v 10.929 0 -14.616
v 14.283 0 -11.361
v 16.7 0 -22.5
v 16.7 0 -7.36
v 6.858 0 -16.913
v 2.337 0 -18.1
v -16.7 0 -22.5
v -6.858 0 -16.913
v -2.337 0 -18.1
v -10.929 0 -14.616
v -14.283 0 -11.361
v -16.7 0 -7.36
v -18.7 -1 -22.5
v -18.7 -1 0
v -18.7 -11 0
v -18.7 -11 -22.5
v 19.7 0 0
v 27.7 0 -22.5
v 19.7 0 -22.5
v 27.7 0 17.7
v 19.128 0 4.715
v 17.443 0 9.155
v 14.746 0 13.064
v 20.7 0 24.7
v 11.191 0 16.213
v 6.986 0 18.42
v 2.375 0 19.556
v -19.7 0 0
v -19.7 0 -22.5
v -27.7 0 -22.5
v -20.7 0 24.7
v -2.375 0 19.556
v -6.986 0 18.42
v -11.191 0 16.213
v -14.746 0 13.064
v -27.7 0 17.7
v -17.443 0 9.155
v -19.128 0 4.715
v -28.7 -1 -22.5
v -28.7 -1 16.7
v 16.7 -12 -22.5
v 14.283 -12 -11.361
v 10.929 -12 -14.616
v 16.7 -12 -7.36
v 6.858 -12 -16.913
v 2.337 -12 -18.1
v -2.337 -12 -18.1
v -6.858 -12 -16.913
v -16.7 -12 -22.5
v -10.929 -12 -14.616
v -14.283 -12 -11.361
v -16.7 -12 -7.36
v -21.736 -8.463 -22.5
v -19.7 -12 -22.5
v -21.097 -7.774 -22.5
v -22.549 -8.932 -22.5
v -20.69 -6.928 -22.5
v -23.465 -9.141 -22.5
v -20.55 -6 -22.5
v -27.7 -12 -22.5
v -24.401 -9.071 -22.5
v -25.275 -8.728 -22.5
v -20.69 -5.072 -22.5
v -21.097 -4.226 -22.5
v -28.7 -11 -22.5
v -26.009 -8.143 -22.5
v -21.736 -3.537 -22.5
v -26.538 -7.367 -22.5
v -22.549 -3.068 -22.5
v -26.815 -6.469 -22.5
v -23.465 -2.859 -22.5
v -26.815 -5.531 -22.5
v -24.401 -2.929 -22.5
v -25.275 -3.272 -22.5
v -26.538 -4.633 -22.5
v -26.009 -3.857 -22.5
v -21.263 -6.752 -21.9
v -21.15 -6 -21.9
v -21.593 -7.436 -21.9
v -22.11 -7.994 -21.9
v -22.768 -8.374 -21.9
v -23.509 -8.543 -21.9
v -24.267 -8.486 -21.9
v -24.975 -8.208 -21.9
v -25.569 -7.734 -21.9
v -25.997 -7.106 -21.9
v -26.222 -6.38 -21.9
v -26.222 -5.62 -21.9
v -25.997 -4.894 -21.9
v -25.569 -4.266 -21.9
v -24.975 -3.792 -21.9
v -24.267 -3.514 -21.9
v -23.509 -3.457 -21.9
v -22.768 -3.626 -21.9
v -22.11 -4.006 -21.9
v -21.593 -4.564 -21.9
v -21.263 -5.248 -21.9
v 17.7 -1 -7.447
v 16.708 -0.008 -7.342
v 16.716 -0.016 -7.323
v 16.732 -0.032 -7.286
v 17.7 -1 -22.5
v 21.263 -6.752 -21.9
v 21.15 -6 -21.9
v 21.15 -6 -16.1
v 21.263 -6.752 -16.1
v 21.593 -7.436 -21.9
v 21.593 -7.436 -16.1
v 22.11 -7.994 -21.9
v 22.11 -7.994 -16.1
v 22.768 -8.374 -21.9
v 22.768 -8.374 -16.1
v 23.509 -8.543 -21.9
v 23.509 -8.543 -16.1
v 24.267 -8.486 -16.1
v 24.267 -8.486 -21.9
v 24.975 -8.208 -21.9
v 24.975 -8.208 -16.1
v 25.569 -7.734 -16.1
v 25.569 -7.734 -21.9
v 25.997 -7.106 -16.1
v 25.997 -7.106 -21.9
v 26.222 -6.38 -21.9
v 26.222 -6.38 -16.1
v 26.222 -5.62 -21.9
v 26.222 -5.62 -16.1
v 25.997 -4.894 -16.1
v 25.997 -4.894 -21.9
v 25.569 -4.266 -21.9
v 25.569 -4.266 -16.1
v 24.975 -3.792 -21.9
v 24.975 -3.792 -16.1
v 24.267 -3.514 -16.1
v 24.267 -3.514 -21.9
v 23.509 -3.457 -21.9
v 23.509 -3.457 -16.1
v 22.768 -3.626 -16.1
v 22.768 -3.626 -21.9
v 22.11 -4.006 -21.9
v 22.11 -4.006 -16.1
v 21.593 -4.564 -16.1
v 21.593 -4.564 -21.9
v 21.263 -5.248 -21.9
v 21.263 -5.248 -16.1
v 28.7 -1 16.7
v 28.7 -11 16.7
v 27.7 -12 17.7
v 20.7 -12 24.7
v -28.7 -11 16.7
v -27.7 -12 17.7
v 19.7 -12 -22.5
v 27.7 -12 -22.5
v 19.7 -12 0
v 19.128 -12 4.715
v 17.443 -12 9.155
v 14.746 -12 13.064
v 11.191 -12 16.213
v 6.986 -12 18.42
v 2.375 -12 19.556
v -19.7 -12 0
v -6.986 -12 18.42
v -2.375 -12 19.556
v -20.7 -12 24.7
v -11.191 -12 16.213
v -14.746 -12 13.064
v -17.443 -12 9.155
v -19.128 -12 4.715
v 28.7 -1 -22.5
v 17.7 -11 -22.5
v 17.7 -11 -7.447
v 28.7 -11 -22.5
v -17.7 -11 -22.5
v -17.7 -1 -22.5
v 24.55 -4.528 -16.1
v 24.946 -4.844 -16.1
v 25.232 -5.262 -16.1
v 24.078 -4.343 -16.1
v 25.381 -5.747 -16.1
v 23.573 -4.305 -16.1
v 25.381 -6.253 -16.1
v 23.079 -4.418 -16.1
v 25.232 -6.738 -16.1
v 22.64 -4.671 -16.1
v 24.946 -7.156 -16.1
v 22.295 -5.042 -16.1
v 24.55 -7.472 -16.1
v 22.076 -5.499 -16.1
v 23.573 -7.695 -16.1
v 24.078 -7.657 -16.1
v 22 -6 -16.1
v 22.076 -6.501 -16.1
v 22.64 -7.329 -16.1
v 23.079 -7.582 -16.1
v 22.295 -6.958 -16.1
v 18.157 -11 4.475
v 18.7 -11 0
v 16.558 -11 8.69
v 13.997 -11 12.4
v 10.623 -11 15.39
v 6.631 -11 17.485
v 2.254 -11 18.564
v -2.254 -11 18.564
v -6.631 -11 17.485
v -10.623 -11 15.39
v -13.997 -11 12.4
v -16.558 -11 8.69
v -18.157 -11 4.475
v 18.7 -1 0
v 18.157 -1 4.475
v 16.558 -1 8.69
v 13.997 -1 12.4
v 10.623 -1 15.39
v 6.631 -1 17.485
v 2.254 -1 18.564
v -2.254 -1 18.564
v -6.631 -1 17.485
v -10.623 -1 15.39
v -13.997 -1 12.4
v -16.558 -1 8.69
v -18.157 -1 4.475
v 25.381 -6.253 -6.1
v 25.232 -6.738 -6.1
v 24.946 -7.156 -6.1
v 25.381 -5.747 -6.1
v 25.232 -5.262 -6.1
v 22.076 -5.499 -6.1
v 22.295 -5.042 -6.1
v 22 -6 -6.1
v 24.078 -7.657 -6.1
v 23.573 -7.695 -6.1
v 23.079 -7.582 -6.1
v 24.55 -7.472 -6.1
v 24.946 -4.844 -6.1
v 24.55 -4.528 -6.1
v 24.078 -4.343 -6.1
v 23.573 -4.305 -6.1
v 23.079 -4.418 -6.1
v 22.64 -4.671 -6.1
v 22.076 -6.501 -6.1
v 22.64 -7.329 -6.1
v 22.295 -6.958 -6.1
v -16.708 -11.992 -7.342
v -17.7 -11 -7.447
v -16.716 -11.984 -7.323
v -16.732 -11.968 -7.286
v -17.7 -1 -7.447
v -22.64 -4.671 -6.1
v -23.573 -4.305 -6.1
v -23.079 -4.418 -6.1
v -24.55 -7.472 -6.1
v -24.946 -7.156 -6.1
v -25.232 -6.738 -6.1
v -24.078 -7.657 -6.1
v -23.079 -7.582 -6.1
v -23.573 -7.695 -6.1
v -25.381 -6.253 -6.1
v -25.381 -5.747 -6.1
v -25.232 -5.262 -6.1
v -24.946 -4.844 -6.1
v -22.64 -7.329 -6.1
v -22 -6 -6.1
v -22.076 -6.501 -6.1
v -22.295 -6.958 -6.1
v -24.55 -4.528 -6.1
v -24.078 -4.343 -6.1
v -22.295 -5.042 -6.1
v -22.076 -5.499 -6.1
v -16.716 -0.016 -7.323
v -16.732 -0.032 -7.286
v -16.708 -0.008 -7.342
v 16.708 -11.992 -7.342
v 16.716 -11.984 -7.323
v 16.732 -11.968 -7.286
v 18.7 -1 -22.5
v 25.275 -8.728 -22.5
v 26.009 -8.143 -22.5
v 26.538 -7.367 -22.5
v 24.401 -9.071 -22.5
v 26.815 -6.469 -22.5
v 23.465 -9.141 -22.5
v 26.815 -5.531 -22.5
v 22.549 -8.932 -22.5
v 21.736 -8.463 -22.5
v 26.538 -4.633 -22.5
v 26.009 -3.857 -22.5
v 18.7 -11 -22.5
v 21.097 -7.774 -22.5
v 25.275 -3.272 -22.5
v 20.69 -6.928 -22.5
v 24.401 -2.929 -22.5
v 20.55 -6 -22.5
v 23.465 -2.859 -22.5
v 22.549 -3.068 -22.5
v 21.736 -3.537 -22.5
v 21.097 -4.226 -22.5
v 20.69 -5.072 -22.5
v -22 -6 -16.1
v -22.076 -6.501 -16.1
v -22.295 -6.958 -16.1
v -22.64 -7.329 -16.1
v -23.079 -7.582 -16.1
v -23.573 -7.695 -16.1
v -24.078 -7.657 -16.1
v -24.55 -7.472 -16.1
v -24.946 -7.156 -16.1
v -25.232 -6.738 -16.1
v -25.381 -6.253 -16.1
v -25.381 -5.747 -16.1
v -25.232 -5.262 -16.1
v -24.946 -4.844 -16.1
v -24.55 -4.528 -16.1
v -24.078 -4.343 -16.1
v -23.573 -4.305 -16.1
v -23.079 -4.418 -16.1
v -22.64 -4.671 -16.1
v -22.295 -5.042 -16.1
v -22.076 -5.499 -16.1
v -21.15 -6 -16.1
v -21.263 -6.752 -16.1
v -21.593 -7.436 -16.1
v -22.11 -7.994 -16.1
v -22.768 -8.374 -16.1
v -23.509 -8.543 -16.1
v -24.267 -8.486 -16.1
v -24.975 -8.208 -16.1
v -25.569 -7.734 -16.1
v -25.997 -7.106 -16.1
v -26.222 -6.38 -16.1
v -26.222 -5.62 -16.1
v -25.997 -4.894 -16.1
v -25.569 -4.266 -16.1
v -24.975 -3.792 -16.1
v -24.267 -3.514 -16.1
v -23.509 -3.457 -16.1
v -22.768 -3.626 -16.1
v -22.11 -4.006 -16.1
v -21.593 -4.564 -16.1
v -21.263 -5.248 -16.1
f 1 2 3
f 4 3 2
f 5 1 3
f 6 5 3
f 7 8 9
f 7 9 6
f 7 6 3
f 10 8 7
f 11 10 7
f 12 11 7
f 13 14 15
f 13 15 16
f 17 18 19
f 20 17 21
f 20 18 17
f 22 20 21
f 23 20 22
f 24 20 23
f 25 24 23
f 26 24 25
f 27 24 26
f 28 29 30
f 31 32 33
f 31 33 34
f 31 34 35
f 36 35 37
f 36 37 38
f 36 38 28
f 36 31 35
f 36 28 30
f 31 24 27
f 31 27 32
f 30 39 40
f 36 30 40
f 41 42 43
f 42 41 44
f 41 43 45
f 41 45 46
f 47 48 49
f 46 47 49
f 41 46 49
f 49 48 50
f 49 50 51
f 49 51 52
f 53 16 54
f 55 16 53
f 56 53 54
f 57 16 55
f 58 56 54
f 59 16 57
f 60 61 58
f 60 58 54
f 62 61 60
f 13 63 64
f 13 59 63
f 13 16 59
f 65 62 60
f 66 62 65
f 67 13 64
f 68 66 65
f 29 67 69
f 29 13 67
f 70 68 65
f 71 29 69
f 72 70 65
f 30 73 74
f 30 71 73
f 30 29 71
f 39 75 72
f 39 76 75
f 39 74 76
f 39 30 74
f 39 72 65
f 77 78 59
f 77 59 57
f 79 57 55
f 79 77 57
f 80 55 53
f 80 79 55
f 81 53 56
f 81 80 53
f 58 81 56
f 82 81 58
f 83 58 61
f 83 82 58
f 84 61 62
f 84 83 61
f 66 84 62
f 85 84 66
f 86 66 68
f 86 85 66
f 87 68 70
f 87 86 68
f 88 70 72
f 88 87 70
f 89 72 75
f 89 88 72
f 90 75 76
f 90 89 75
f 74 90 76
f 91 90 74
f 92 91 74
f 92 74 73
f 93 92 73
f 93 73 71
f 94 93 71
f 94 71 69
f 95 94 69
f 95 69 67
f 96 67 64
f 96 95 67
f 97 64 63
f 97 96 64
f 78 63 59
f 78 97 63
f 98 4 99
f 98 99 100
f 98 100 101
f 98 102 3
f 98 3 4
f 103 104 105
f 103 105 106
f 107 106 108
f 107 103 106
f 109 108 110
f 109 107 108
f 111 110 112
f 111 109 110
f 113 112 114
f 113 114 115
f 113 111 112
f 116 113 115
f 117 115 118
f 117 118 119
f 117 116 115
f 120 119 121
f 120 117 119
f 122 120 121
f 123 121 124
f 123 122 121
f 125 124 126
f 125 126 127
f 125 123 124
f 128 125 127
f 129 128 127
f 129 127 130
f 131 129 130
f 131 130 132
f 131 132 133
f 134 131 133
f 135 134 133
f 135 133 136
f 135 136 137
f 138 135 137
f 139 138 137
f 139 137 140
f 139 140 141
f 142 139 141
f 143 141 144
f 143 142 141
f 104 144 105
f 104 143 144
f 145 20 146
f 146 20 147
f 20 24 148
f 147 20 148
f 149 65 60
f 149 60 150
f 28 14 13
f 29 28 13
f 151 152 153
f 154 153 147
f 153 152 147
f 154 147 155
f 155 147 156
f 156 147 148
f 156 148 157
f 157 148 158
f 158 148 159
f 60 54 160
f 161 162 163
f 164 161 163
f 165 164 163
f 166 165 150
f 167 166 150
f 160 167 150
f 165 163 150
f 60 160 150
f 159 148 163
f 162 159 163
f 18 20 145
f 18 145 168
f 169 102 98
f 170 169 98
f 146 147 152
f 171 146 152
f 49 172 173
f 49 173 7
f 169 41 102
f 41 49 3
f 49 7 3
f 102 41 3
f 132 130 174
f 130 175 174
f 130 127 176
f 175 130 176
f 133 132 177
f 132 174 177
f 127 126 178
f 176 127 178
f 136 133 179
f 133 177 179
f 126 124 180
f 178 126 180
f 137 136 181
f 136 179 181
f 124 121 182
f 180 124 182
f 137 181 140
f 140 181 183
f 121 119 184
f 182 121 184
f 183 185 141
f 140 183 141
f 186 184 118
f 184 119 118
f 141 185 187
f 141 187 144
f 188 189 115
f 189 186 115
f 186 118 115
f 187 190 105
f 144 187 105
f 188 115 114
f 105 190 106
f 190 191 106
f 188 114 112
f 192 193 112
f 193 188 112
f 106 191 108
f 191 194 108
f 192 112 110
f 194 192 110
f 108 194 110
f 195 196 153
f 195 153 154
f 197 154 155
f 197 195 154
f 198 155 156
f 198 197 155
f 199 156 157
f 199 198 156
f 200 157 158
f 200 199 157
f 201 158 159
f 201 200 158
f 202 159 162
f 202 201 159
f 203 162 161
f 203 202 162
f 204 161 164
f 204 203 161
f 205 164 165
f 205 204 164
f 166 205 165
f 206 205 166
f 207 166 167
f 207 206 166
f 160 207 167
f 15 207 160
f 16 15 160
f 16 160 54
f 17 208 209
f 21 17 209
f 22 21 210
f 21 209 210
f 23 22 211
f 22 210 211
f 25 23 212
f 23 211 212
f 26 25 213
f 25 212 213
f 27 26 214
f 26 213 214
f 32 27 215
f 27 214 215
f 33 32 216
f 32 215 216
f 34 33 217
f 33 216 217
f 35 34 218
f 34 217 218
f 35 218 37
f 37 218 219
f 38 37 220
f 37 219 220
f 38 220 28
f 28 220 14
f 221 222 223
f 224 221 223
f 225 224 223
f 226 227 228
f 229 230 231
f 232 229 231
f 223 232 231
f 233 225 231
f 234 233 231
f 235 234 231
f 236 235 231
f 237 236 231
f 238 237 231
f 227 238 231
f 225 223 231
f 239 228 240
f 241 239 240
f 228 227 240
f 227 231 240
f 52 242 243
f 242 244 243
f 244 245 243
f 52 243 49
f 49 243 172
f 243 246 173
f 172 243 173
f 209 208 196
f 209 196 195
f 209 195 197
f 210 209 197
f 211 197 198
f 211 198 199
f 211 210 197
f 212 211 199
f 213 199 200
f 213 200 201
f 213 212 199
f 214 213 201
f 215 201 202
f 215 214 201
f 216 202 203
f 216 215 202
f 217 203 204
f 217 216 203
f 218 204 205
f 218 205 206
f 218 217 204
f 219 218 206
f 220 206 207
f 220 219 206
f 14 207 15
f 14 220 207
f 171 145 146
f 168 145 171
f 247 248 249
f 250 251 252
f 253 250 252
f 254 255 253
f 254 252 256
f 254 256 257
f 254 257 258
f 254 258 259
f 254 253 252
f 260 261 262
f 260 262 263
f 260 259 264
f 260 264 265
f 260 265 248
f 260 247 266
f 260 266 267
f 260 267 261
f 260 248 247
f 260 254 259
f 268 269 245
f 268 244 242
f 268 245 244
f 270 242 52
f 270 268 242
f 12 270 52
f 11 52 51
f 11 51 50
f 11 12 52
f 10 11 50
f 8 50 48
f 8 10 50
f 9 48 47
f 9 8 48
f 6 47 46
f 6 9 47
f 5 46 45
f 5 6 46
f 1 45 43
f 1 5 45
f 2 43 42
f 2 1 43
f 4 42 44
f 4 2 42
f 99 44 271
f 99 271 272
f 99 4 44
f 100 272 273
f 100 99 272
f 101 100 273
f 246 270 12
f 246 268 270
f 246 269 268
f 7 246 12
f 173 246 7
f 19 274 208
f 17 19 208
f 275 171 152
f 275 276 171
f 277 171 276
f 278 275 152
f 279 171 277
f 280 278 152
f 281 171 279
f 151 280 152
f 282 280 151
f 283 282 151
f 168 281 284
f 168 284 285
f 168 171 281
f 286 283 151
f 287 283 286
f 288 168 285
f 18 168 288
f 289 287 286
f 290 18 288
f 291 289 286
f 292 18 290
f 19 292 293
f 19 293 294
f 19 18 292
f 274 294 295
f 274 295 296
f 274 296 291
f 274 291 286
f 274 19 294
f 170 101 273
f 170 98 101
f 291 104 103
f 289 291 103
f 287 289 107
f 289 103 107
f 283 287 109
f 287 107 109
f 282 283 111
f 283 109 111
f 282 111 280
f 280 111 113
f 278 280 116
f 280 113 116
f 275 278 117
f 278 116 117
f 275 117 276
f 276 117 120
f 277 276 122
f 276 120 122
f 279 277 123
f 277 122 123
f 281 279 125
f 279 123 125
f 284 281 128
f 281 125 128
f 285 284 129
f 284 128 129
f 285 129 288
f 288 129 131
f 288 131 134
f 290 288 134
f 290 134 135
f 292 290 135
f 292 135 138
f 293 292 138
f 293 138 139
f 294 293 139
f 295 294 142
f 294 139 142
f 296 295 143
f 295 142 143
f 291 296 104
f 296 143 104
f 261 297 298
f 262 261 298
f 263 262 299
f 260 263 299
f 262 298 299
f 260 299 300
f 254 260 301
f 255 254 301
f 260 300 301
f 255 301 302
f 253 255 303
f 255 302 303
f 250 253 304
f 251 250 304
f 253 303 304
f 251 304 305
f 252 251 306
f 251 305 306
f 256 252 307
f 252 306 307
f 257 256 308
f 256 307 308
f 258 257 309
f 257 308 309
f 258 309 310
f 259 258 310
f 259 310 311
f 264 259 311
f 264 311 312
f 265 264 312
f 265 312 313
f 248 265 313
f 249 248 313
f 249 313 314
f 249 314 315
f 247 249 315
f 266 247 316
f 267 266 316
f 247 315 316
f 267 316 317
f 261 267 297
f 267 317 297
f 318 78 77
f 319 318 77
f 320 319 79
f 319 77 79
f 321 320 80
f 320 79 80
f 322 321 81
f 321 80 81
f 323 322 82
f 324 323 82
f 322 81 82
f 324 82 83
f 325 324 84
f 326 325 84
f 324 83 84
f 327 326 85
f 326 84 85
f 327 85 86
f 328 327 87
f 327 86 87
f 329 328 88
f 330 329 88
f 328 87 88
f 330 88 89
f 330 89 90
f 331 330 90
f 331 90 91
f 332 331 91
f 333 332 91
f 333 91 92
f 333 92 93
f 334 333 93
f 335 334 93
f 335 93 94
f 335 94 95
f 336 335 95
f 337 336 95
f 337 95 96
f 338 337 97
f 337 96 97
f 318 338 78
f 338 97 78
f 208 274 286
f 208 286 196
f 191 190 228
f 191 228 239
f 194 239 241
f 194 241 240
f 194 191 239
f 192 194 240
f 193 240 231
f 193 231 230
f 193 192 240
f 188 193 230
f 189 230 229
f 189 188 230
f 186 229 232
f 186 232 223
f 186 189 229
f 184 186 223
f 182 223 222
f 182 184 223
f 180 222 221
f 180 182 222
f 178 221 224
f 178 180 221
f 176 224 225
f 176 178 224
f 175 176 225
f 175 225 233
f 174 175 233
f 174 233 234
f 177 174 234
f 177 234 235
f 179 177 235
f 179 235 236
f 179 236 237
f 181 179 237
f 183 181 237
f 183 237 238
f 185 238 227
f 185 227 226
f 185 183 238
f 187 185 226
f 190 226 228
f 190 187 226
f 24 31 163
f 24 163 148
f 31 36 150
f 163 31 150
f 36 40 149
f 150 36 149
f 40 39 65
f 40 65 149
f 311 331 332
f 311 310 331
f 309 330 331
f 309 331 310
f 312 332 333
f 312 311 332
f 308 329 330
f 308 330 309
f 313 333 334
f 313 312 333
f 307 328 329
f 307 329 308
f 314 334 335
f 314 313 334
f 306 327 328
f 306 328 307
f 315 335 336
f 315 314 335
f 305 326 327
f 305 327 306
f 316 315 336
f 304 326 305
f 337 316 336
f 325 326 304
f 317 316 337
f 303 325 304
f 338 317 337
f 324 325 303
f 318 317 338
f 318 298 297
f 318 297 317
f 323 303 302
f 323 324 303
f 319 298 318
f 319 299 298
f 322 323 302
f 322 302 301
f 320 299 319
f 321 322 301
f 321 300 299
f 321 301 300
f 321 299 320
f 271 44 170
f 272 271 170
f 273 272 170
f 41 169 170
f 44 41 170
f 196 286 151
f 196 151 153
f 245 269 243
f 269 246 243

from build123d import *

# Parameters (mm, degrees)
PAD_DEPTH       = 12
SKETCH001_R     = 2.55
POCKET_DEPTH    = 6.4
SKETCH002_R     = 1.7
POCKET001_DEPTH = 10
CHAMFER_SIZE    = 0.6
CHAMFER001_SIZE = 8
CHAMFER002_SIZE = 1
CHAMFER003_SIZE = 1
PAD001_DEPTH    = 12
CHAMFER004_SIZE = 3
CHAMFER005_SIZE = 1


with BuildPart() as clamp:
    # Sketch → Pad (new body)
    with BuildSketch(Plane.XZ):
        with BuildLine():
            ThreePointArc((18.7, 0), (0, 18.7), (-18.7, 0))
            Line((-18.7, 0), (-18.7, -22.5))
            Line((-18.7, -22.5), (-28.7, -22.5))
            Line((-28.7, -22.5), (-28.7, 24.7))
            Line((-28.7, 24.7), (28.7, 24.7))
            Line((28.7, 24.7), (28.7, -22.5))
            Line((28.7, -22.5), (18.7, -22.5))
            Line((18.7, -22.5), (18.7, 0))
        make_face()
    extrude(amount=PAD_DEPTH)

    # Sketch001 (on Face3 of Pad) → Pocket (cut)
    with BuildSketch(Plane(origin=(0, 0, -22.5), x_dir=(1, 0, 0), z_dir=(0, 0, -1))):
        with Locations((-23.7, 6)):
            Circle(SKETCH001_R)
    pocket = extrude(amount=-POCKET_DEPTH, mode=Mode.SUBTRACT)

    # Mirrored: Pocket across Sketch001 V_Axis
    add(pocket.mirror(Plane(origin=(0, 0, -22.5), x_dir=(0, 0, -1), z_dir=(1, 0, 0))), mode=Mode.SUBTRACT)

    # Sketch002 (on Face14 of Mirrored) → Pocket001 (cut)
    with BuildSketch(Plane(origin=(0, 0, -16.1), x_dir=(1, 0, 0), z_dir=(0, 0, -1))):
        with Locations((-23.7, 6)):
            Circle(SKETCH002_R)
    pocket001 = extrude(amount=-POCKET001_DEPTH, mode=Mode.SUBTRACT)

    # Mirrored001: Pocket001 across Sketch002 V_Axis
    add(pocket001.mirror(Plane(origin=(0, 0, -16.1), x_dir=(0, 0, -1), z_dir=(1, 0, 0))), mode=Mode.SUBTRACT)

    # Chamfer
    chamfer_edges = [clamp.edges().sort_by_distance(p)[0] for p in [
        (-26.25, -6, -22.5),
        (26.25, -6, -22.5),
    ]]
    chamfer(chamfer_edges, length=CHAMFER_SIZE)

    # Chamfer001
    chamfer001_edges = [clamp.edges().sort_by_distance(p)[0] for p in [
        (-28.7, -6, 24.7),
        (28.7, -6, 24.7),
    ]]
    chamfer(chamfer001_edges, length=CHAMFER001_SIZE)

    # Chamfer002
    chamfer002_edges = [clamp.edges().sort_by_distance(p)[0] for p in [
        (-28.7, 0, -2.9),
        (-28.7, -12, -2.9),
        (28.7, 0, -2.9),
        (28.7, -12, -2.9),
    ]]
    chamfer(chamfer002_edges, length=CHAMFER002_SIZE)

    # Chamfer003
    chamfer003_edges = [clamp.edges().sort_by_distance(p)[0] for p in [
        (-18.7, 0, -11.25),
        (0, 0, 18.7),
        (18.7, 0, -11.25),
        (18.7, -12, -11.25),
        (0, -12, 18.7),
        (-18.7, -12, -11.25),
    ]]
    chamfer(chamfer003_edges, length=CHAMFER003_SIZE)


with BuildPart() as base:
    # Sketch003 → Pad001 (new body)
    with BuildSketch(Plane.XZ):
        with BuildLine():
            ThreePointArc((-17.7, -4.446628), (0, -18.25), (17.7, -4.446628))
            Line((17.7, -22.5), (17.7, -4.446628))
            Line((-17.7, -22.5), (17.7, -22.5))
            Line((-17.7, -4.446628), (-17.7, -22.5))
        make_face()
    extrude(amount=PAD001_DEPTH)

    # Chamfer004
    chamfer004_edges = [base.edges().sort_by_distance(p)[0] for p in [
        (-17.7, -6, -4.446628),
        (17.7, -6, -4.446628),
    ]]
    chamfer(chamfer004_edges, length=CHAMFER004_SIZE)

    # Chamfer005
    chamfer005_edges = [base.edges().sort_by_distance(p)[0] for p in [
        (-17.7, -12, -14.973314),
        (-17.7, 0, -14.973314),
        (17.7, -12, -14.973314),
        (17.7, 0, -14.973314),
    ]]
    chamfer(chamfer005_edges, length=CHAMFER005_SIZE)


solid = Compound([clamp.part, base.part])
